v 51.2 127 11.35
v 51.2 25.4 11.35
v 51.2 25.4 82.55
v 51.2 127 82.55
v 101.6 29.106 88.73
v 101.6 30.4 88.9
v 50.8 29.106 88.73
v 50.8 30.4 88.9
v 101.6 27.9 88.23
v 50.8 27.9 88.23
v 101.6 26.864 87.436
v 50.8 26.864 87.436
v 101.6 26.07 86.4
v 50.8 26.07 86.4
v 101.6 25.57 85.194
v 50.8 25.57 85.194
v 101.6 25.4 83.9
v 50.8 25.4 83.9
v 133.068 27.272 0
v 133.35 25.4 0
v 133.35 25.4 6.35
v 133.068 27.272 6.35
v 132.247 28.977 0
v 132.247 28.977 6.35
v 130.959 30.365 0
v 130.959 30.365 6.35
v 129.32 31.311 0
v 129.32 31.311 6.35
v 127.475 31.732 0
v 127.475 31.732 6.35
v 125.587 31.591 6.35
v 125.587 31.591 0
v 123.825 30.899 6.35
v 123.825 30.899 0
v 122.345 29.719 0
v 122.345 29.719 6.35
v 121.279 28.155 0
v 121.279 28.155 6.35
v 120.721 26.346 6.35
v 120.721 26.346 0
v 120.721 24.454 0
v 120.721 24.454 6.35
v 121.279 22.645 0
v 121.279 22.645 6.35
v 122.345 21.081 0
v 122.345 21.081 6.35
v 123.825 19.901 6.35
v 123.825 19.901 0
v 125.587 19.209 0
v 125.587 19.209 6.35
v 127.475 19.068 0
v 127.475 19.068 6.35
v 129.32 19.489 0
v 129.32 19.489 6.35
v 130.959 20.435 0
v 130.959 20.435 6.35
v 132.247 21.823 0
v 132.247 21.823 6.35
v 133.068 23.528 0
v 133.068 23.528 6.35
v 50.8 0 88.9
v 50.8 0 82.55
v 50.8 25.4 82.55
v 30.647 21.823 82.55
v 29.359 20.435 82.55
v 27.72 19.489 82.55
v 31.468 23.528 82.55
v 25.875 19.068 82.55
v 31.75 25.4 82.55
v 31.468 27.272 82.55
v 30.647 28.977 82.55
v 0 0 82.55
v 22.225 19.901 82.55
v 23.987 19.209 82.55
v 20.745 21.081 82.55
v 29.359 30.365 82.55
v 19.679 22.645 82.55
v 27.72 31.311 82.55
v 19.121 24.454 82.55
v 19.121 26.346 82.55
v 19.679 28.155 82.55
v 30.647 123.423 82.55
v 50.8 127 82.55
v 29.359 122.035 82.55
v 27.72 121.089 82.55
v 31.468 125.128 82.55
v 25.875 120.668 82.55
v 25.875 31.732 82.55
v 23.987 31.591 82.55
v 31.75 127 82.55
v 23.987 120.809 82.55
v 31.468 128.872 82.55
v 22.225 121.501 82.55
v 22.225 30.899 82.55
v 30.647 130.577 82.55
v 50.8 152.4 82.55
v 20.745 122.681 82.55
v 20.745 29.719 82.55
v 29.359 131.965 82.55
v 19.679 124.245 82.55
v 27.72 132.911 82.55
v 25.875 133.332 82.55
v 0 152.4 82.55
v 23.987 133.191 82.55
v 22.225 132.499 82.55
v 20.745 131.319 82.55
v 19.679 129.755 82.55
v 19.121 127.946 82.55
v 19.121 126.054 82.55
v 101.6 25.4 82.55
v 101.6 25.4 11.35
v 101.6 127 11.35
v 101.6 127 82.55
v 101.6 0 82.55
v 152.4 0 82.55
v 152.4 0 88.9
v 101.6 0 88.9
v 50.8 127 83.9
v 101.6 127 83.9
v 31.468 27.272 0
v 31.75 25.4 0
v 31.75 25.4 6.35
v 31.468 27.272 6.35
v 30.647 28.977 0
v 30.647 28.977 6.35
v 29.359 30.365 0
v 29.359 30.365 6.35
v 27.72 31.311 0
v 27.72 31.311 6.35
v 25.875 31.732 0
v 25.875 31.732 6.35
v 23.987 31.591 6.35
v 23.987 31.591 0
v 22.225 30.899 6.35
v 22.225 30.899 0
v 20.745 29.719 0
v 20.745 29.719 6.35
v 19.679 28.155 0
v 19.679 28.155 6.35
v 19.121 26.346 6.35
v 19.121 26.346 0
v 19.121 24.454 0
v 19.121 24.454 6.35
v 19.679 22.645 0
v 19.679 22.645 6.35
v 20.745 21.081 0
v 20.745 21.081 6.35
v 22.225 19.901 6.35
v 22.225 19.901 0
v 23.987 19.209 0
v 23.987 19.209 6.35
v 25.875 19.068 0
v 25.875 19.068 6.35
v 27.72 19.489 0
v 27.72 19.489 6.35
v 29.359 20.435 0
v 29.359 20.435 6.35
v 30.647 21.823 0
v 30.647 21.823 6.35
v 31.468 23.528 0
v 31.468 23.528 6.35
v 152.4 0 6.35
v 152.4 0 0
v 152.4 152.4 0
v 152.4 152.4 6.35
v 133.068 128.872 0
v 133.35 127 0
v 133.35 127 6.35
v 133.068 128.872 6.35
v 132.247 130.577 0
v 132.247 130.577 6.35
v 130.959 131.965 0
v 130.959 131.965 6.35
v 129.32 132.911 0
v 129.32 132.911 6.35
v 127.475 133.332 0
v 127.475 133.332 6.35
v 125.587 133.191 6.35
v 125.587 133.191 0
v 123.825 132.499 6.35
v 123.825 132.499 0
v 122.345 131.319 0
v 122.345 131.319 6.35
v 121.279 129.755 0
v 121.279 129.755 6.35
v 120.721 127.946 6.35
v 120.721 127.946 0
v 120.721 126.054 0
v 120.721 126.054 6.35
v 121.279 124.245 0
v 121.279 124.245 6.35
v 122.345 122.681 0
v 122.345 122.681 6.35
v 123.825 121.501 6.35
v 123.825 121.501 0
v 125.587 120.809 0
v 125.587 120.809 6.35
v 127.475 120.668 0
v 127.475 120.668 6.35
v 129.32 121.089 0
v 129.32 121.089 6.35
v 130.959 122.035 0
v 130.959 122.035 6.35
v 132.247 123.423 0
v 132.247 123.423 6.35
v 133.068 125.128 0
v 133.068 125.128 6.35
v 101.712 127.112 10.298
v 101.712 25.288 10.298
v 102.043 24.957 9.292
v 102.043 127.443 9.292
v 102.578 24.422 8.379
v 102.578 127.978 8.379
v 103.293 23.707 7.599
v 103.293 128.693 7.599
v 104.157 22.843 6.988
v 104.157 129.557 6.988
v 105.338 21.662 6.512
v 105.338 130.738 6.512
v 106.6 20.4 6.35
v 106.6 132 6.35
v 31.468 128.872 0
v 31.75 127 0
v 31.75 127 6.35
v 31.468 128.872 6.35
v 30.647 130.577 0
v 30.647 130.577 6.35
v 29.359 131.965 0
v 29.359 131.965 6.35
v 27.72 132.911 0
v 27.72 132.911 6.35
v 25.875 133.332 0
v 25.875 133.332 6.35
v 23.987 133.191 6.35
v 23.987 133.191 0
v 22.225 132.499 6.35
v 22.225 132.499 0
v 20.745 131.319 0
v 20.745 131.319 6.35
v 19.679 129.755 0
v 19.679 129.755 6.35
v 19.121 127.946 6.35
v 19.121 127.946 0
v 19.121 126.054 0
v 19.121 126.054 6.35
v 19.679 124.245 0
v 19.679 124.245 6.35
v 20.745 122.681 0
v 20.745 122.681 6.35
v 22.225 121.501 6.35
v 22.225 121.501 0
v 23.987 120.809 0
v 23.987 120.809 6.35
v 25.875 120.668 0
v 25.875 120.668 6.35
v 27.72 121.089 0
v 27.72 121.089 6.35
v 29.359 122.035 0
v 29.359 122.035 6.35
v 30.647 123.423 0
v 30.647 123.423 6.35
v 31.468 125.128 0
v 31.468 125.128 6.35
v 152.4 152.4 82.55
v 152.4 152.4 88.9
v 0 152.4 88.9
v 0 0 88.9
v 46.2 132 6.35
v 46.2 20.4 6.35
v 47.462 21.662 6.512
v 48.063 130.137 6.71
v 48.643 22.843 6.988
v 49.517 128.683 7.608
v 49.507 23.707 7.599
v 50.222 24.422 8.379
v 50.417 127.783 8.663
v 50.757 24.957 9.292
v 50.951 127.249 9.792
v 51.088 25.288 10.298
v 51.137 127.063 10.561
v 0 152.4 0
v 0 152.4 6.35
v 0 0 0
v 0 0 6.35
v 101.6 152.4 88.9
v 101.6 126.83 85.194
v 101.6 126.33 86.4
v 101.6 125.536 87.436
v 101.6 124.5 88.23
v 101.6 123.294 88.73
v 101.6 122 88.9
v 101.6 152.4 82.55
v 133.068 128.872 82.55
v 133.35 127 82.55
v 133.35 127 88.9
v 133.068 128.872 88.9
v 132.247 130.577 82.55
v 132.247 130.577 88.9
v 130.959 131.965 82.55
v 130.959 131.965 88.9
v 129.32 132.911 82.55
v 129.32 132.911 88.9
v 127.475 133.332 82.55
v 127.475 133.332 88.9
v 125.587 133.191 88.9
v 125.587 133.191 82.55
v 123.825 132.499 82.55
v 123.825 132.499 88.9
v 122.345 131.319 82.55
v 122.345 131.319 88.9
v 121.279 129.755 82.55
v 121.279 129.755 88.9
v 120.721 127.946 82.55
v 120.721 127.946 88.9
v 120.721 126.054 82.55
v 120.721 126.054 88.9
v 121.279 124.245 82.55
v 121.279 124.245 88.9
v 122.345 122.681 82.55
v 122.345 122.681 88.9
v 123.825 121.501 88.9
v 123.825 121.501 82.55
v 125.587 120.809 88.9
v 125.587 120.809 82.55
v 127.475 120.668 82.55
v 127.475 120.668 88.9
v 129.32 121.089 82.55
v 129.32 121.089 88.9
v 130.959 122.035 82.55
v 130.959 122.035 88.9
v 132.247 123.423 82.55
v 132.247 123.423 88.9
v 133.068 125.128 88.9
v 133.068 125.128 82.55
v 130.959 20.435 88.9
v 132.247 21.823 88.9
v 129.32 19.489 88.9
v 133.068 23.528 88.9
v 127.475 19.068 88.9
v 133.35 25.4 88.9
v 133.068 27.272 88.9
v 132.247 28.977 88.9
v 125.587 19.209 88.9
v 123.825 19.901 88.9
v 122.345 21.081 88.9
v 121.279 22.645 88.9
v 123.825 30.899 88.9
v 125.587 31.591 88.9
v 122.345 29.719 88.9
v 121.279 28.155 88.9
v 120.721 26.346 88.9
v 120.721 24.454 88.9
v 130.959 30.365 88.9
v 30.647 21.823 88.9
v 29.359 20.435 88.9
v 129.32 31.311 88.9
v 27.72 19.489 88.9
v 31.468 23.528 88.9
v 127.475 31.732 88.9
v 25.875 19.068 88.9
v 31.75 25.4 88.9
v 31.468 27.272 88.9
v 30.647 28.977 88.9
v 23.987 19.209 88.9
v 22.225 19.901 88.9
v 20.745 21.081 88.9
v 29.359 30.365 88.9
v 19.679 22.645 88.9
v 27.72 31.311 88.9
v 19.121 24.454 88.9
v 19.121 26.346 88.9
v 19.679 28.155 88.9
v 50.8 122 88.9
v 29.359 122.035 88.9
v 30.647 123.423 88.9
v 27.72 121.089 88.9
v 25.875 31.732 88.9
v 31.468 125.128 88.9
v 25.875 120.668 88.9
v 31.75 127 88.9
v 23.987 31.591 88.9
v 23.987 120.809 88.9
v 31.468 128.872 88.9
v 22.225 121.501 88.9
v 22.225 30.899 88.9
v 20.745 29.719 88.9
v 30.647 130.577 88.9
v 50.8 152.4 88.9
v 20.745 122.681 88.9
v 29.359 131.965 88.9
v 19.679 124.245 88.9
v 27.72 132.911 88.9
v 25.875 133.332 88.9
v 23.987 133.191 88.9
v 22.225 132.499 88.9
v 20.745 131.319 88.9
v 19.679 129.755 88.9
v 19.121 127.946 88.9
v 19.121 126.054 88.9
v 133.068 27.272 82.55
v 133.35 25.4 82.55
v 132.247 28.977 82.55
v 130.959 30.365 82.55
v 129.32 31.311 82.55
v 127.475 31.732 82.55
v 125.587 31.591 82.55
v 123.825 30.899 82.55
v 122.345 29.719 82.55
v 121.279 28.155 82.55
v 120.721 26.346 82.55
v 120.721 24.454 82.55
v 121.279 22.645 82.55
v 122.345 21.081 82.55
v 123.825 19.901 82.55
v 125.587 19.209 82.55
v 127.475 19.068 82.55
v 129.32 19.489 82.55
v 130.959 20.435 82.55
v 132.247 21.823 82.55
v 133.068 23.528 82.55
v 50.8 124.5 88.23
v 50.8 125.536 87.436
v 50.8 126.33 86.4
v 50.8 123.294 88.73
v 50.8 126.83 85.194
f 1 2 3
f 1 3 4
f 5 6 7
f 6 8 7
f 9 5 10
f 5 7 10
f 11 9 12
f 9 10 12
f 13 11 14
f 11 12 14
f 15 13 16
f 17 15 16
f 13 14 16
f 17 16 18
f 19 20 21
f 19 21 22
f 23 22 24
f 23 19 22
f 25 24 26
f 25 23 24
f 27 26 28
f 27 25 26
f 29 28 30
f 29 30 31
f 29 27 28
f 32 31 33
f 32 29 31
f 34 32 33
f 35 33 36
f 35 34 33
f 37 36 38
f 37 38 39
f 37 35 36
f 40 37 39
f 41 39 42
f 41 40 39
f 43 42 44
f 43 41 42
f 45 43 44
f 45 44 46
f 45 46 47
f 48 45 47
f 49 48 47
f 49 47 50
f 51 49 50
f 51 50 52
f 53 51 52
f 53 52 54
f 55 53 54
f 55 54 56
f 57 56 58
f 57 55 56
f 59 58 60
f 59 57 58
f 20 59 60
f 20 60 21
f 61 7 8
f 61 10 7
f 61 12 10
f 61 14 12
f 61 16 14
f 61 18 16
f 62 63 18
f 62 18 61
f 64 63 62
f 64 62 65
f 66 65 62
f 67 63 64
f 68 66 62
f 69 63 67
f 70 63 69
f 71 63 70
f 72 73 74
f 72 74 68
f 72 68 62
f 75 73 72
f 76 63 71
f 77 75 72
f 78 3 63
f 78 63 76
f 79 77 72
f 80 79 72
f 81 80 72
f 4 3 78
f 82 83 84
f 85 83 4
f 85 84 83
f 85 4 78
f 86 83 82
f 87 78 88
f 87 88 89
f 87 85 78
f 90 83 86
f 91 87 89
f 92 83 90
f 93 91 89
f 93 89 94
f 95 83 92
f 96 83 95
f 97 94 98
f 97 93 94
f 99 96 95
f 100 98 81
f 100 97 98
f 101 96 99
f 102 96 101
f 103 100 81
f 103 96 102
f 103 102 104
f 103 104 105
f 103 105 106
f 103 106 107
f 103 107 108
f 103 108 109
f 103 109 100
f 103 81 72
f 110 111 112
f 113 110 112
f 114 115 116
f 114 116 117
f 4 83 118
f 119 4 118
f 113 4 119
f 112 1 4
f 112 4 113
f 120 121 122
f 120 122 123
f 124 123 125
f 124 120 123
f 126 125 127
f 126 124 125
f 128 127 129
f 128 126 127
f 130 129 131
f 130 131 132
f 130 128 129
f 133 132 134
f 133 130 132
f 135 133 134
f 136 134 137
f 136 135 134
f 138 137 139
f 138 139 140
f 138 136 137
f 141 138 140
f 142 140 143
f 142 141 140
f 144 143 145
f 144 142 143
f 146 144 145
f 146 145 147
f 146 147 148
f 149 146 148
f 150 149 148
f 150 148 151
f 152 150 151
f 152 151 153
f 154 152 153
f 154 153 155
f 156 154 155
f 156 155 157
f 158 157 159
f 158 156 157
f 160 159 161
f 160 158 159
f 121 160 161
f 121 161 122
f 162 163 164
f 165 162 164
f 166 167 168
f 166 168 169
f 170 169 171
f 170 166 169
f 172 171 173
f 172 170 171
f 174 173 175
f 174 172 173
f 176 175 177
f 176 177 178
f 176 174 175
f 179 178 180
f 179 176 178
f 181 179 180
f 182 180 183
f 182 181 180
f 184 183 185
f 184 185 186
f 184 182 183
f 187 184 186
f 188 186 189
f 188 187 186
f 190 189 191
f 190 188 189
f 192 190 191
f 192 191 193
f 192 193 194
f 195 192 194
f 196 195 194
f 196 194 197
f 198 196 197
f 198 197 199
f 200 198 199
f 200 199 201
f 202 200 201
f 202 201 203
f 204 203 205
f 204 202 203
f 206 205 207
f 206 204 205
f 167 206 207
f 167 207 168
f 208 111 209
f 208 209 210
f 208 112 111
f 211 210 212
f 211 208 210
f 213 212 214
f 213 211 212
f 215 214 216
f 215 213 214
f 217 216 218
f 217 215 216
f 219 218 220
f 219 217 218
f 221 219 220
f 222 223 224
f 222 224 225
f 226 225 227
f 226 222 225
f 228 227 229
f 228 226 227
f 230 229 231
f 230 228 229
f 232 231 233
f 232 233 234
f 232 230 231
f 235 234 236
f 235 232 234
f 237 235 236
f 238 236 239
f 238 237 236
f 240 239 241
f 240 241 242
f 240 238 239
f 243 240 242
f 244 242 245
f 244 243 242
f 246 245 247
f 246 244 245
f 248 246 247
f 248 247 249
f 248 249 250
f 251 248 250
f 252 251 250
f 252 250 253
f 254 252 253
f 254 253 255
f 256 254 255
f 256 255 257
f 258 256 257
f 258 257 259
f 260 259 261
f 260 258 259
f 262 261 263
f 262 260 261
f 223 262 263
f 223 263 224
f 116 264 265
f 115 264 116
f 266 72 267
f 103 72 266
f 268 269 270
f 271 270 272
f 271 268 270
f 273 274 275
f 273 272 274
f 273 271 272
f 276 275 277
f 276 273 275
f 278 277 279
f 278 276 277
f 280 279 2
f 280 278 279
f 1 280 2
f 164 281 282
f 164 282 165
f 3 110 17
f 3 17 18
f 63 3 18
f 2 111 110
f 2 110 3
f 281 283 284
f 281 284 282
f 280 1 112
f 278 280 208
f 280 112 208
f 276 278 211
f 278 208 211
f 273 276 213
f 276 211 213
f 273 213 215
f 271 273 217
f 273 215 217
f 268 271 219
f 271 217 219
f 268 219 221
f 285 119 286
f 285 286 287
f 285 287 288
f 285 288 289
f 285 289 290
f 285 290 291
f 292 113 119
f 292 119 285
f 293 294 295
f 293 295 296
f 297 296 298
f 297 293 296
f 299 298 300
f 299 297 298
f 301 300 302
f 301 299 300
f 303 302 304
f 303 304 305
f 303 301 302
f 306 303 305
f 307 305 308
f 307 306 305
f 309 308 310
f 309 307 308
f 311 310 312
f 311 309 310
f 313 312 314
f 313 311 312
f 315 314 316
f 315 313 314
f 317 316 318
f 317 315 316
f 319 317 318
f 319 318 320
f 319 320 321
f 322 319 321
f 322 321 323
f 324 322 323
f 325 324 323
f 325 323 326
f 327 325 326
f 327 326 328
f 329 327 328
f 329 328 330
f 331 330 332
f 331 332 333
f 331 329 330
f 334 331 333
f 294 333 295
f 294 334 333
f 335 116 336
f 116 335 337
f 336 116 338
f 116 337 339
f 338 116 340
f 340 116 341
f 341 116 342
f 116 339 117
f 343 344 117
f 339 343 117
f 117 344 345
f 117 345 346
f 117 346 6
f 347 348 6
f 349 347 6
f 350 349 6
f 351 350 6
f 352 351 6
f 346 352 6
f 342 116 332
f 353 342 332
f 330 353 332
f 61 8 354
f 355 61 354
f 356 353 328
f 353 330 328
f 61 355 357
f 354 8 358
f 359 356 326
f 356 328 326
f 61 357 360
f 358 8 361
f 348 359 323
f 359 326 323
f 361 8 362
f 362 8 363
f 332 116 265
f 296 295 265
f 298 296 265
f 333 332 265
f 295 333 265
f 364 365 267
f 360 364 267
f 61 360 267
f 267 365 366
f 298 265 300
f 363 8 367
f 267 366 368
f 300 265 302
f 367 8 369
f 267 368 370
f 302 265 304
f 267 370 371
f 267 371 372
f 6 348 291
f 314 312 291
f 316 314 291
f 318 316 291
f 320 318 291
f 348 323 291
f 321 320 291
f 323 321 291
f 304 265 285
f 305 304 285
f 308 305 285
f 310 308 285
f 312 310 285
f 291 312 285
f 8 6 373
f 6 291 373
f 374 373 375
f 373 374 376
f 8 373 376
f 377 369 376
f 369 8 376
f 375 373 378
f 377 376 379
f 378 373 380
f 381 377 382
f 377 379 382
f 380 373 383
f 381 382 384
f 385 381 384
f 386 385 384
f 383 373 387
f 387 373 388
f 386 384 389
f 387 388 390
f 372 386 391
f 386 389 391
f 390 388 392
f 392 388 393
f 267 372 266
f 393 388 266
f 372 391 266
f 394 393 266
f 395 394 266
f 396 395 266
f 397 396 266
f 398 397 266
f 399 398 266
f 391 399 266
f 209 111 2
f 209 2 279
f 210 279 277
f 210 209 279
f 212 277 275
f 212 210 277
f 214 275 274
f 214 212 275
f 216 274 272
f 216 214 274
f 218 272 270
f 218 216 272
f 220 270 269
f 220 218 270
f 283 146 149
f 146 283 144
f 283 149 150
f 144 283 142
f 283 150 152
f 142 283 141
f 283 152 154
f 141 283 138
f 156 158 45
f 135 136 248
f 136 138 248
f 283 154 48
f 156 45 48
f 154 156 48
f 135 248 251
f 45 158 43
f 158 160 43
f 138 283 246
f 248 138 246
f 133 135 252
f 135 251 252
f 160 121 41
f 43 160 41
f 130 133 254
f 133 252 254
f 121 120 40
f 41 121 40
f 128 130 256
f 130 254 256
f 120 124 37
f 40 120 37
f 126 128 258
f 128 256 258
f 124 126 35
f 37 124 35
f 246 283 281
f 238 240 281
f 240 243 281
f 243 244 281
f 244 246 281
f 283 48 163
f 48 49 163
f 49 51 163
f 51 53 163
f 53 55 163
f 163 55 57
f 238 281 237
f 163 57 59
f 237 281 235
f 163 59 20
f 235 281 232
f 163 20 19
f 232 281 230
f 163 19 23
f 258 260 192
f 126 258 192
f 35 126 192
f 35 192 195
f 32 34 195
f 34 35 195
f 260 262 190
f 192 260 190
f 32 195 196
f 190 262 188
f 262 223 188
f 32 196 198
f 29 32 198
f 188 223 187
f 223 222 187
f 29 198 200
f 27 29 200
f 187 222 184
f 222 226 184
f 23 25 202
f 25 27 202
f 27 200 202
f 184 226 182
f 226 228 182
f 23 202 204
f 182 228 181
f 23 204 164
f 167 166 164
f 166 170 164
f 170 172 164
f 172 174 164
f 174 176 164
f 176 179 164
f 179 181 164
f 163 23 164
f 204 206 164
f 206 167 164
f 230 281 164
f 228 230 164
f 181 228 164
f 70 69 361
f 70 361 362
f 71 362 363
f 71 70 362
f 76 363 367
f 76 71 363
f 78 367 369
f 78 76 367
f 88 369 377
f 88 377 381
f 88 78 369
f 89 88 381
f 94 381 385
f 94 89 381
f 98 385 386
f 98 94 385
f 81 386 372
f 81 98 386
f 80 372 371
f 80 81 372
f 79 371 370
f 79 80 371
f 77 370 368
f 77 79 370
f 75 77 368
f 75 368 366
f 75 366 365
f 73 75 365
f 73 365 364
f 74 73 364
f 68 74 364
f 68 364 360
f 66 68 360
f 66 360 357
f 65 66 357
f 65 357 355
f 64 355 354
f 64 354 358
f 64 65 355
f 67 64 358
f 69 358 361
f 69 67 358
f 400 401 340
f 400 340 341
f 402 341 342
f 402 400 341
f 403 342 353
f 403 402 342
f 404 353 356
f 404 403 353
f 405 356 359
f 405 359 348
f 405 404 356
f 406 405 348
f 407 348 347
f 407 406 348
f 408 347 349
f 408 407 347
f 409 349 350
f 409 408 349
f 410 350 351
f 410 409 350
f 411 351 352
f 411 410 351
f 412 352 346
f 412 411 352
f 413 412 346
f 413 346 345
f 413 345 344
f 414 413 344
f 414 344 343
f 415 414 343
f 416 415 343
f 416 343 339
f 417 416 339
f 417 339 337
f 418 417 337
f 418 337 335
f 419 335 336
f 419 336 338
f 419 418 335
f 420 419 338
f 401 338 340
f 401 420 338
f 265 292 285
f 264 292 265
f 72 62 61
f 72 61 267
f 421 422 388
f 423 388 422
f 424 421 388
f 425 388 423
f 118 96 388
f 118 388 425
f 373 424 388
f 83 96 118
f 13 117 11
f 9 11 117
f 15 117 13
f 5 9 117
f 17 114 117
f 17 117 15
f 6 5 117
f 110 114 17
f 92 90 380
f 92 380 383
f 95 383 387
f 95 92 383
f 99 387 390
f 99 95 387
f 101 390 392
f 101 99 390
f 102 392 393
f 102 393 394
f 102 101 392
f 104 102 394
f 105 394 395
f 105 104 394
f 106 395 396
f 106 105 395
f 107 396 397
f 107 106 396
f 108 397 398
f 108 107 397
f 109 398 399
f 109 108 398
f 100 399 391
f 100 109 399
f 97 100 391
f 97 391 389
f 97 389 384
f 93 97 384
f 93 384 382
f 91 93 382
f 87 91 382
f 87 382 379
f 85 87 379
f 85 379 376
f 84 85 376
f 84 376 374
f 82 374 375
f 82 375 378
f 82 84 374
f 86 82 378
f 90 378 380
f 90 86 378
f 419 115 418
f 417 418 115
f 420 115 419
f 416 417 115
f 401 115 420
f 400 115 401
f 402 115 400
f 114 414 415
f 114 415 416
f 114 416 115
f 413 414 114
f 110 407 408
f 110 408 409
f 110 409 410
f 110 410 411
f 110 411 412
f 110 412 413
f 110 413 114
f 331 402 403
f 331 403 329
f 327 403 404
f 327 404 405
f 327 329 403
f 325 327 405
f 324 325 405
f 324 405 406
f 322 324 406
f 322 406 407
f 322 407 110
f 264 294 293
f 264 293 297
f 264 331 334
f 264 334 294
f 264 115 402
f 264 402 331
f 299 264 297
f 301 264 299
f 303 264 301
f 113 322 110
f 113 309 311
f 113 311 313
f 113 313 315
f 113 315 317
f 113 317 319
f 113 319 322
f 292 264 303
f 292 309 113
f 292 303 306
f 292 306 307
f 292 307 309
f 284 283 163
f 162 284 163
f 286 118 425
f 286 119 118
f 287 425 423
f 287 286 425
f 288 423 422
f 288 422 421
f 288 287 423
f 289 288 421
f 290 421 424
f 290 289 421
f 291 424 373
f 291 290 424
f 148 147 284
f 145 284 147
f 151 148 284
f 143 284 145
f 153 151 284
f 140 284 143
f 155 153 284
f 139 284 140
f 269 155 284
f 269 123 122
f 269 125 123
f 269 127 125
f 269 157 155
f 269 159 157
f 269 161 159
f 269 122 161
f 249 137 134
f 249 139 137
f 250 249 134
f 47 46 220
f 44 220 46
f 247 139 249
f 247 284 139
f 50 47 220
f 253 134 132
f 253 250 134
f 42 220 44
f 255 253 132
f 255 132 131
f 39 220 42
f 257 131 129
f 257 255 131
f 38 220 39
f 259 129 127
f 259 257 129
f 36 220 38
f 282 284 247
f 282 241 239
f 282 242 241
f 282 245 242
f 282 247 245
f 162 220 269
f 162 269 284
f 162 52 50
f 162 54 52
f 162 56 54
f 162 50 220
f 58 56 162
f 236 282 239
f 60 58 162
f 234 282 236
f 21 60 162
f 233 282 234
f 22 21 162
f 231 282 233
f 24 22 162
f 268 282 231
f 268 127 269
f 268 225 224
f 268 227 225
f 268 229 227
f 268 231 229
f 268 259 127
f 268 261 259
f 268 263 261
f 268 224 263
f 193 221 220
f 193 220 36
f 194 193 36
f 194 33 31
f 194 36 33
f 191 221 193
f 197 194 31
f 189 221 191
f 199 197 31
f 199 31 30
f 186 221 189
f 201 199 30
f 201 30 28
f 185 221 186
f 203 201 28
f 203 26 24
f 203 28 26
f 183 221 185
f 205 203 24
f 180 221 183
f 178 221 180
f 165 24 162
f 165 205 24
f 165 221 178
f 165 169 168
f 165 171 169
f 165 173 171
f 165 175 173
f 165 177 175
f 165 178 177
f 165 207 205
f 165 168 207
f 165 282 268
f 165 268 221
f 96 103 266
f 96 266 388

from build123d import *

# Parameters (mm, degrees)
SKETCH1_W           = 152.4
SKETCH1_H           = 152.4
SKETCH1_R           = 6.35
BOSS_EXTRUDE1_DEPTH = 6.35
SKETCH2_W           = 50.4
SKETCH2_H           = 101.6
BOSS_EXTRUDE2_DEPTH = 76.2
SKETCH3_R           = 6.35
BOSS_EXTRUDE3_DEPTH = 6.35
FILLET2_R           = 5
FILLET6_R           = 5


with BuildPart() as part:
    # Sketch1 → Boss-Extrude1 (new body)
    with BuildSketch(Plane.XY):
        with Locations((76.2, 76.2)):
            Rectangle(SKETCH1_W, SKETCH1_H)
        with Locations((25.4, 127)):
            Circle(SKETCH1_R, mode=Mode.SUBTRACT)
        with Locations((127, 127)):
            Circle(SKETCH1_R, mode=Mode.SUBTRACT)
        with Locations((127, 25.4)):
            Circle(SKETCH1_R, mode=Mode.SUBTRACT)
        with Locations((25.4, 25.4)):
            Circle(SKETCH1_R, mode=Mode.SUBTRACT)
    extrude(amount=BOSS_EXTRUDE1_DEPTH)

    # Sketch2 → Boss-Extrude2 (add)
    with BuildSketch(Plane.XY.offset(6.35)):
        with Locations((76.4, 76.2)):
            Rectangle(SKETCH2_W, SKETCH2_H)
    extrude(amount=BOSS_EXTRUDE2_DEPTH)

    # Sketch3 → Boss-Extrude3 (add)
    with BuildSketch(Plane.XY.offset(82.55)):
        Polygon((101.6, 152.4), (152.4, 152.4), (152.4, 0), (101.6, 0), (101.6, 25.4), (50.8, 25.4), (50.8, 0), (0, 0), (0, 152.4), (50.8, 152.4), (50.8, 127), (101.6, 127), align=None)
        with Locations((25.4, 127)):
            Circle(SKETCH3_R, mode=Mode.SUBTRACT)
        with Locations((127, 127)):
            Circle(SKETCH3_R, mode=Mode.SUBTRACT)
        with Locations((127, 25.4)):
            Circle(SKETCH3_R, mode=Mode.SUBTRACT)
        with Locations((25.4, 25.4)):
            Circle(SKETCH3_R, mode=Mode.SUBTRACT)
    extrude(amount=BOSS_EXTRUDE3_DEPTH)

    # Fillet2
    fillet2_edges = [part.edges().sort_by_distance(p)[0] for p in [
        (76.4, 25.4, 6.35),
        (51.2, 76.2, 6.35),
        (76.4, 127, 6.35),
        (101.6, 76.2, 6.35),
    ]]
    fillet(fillet2_edges, radius=FILLET2_R)

    # Fillet6
    fillet6_edges = [part.edges().sort_by_distance(p)[0] for p in [
        (76.2, 25.4, 88.9),
        (76.2, 127, 88.9),
    ]]
    fillet(fillet6_edges, radius=FILLET6_R)


solid = part.part
